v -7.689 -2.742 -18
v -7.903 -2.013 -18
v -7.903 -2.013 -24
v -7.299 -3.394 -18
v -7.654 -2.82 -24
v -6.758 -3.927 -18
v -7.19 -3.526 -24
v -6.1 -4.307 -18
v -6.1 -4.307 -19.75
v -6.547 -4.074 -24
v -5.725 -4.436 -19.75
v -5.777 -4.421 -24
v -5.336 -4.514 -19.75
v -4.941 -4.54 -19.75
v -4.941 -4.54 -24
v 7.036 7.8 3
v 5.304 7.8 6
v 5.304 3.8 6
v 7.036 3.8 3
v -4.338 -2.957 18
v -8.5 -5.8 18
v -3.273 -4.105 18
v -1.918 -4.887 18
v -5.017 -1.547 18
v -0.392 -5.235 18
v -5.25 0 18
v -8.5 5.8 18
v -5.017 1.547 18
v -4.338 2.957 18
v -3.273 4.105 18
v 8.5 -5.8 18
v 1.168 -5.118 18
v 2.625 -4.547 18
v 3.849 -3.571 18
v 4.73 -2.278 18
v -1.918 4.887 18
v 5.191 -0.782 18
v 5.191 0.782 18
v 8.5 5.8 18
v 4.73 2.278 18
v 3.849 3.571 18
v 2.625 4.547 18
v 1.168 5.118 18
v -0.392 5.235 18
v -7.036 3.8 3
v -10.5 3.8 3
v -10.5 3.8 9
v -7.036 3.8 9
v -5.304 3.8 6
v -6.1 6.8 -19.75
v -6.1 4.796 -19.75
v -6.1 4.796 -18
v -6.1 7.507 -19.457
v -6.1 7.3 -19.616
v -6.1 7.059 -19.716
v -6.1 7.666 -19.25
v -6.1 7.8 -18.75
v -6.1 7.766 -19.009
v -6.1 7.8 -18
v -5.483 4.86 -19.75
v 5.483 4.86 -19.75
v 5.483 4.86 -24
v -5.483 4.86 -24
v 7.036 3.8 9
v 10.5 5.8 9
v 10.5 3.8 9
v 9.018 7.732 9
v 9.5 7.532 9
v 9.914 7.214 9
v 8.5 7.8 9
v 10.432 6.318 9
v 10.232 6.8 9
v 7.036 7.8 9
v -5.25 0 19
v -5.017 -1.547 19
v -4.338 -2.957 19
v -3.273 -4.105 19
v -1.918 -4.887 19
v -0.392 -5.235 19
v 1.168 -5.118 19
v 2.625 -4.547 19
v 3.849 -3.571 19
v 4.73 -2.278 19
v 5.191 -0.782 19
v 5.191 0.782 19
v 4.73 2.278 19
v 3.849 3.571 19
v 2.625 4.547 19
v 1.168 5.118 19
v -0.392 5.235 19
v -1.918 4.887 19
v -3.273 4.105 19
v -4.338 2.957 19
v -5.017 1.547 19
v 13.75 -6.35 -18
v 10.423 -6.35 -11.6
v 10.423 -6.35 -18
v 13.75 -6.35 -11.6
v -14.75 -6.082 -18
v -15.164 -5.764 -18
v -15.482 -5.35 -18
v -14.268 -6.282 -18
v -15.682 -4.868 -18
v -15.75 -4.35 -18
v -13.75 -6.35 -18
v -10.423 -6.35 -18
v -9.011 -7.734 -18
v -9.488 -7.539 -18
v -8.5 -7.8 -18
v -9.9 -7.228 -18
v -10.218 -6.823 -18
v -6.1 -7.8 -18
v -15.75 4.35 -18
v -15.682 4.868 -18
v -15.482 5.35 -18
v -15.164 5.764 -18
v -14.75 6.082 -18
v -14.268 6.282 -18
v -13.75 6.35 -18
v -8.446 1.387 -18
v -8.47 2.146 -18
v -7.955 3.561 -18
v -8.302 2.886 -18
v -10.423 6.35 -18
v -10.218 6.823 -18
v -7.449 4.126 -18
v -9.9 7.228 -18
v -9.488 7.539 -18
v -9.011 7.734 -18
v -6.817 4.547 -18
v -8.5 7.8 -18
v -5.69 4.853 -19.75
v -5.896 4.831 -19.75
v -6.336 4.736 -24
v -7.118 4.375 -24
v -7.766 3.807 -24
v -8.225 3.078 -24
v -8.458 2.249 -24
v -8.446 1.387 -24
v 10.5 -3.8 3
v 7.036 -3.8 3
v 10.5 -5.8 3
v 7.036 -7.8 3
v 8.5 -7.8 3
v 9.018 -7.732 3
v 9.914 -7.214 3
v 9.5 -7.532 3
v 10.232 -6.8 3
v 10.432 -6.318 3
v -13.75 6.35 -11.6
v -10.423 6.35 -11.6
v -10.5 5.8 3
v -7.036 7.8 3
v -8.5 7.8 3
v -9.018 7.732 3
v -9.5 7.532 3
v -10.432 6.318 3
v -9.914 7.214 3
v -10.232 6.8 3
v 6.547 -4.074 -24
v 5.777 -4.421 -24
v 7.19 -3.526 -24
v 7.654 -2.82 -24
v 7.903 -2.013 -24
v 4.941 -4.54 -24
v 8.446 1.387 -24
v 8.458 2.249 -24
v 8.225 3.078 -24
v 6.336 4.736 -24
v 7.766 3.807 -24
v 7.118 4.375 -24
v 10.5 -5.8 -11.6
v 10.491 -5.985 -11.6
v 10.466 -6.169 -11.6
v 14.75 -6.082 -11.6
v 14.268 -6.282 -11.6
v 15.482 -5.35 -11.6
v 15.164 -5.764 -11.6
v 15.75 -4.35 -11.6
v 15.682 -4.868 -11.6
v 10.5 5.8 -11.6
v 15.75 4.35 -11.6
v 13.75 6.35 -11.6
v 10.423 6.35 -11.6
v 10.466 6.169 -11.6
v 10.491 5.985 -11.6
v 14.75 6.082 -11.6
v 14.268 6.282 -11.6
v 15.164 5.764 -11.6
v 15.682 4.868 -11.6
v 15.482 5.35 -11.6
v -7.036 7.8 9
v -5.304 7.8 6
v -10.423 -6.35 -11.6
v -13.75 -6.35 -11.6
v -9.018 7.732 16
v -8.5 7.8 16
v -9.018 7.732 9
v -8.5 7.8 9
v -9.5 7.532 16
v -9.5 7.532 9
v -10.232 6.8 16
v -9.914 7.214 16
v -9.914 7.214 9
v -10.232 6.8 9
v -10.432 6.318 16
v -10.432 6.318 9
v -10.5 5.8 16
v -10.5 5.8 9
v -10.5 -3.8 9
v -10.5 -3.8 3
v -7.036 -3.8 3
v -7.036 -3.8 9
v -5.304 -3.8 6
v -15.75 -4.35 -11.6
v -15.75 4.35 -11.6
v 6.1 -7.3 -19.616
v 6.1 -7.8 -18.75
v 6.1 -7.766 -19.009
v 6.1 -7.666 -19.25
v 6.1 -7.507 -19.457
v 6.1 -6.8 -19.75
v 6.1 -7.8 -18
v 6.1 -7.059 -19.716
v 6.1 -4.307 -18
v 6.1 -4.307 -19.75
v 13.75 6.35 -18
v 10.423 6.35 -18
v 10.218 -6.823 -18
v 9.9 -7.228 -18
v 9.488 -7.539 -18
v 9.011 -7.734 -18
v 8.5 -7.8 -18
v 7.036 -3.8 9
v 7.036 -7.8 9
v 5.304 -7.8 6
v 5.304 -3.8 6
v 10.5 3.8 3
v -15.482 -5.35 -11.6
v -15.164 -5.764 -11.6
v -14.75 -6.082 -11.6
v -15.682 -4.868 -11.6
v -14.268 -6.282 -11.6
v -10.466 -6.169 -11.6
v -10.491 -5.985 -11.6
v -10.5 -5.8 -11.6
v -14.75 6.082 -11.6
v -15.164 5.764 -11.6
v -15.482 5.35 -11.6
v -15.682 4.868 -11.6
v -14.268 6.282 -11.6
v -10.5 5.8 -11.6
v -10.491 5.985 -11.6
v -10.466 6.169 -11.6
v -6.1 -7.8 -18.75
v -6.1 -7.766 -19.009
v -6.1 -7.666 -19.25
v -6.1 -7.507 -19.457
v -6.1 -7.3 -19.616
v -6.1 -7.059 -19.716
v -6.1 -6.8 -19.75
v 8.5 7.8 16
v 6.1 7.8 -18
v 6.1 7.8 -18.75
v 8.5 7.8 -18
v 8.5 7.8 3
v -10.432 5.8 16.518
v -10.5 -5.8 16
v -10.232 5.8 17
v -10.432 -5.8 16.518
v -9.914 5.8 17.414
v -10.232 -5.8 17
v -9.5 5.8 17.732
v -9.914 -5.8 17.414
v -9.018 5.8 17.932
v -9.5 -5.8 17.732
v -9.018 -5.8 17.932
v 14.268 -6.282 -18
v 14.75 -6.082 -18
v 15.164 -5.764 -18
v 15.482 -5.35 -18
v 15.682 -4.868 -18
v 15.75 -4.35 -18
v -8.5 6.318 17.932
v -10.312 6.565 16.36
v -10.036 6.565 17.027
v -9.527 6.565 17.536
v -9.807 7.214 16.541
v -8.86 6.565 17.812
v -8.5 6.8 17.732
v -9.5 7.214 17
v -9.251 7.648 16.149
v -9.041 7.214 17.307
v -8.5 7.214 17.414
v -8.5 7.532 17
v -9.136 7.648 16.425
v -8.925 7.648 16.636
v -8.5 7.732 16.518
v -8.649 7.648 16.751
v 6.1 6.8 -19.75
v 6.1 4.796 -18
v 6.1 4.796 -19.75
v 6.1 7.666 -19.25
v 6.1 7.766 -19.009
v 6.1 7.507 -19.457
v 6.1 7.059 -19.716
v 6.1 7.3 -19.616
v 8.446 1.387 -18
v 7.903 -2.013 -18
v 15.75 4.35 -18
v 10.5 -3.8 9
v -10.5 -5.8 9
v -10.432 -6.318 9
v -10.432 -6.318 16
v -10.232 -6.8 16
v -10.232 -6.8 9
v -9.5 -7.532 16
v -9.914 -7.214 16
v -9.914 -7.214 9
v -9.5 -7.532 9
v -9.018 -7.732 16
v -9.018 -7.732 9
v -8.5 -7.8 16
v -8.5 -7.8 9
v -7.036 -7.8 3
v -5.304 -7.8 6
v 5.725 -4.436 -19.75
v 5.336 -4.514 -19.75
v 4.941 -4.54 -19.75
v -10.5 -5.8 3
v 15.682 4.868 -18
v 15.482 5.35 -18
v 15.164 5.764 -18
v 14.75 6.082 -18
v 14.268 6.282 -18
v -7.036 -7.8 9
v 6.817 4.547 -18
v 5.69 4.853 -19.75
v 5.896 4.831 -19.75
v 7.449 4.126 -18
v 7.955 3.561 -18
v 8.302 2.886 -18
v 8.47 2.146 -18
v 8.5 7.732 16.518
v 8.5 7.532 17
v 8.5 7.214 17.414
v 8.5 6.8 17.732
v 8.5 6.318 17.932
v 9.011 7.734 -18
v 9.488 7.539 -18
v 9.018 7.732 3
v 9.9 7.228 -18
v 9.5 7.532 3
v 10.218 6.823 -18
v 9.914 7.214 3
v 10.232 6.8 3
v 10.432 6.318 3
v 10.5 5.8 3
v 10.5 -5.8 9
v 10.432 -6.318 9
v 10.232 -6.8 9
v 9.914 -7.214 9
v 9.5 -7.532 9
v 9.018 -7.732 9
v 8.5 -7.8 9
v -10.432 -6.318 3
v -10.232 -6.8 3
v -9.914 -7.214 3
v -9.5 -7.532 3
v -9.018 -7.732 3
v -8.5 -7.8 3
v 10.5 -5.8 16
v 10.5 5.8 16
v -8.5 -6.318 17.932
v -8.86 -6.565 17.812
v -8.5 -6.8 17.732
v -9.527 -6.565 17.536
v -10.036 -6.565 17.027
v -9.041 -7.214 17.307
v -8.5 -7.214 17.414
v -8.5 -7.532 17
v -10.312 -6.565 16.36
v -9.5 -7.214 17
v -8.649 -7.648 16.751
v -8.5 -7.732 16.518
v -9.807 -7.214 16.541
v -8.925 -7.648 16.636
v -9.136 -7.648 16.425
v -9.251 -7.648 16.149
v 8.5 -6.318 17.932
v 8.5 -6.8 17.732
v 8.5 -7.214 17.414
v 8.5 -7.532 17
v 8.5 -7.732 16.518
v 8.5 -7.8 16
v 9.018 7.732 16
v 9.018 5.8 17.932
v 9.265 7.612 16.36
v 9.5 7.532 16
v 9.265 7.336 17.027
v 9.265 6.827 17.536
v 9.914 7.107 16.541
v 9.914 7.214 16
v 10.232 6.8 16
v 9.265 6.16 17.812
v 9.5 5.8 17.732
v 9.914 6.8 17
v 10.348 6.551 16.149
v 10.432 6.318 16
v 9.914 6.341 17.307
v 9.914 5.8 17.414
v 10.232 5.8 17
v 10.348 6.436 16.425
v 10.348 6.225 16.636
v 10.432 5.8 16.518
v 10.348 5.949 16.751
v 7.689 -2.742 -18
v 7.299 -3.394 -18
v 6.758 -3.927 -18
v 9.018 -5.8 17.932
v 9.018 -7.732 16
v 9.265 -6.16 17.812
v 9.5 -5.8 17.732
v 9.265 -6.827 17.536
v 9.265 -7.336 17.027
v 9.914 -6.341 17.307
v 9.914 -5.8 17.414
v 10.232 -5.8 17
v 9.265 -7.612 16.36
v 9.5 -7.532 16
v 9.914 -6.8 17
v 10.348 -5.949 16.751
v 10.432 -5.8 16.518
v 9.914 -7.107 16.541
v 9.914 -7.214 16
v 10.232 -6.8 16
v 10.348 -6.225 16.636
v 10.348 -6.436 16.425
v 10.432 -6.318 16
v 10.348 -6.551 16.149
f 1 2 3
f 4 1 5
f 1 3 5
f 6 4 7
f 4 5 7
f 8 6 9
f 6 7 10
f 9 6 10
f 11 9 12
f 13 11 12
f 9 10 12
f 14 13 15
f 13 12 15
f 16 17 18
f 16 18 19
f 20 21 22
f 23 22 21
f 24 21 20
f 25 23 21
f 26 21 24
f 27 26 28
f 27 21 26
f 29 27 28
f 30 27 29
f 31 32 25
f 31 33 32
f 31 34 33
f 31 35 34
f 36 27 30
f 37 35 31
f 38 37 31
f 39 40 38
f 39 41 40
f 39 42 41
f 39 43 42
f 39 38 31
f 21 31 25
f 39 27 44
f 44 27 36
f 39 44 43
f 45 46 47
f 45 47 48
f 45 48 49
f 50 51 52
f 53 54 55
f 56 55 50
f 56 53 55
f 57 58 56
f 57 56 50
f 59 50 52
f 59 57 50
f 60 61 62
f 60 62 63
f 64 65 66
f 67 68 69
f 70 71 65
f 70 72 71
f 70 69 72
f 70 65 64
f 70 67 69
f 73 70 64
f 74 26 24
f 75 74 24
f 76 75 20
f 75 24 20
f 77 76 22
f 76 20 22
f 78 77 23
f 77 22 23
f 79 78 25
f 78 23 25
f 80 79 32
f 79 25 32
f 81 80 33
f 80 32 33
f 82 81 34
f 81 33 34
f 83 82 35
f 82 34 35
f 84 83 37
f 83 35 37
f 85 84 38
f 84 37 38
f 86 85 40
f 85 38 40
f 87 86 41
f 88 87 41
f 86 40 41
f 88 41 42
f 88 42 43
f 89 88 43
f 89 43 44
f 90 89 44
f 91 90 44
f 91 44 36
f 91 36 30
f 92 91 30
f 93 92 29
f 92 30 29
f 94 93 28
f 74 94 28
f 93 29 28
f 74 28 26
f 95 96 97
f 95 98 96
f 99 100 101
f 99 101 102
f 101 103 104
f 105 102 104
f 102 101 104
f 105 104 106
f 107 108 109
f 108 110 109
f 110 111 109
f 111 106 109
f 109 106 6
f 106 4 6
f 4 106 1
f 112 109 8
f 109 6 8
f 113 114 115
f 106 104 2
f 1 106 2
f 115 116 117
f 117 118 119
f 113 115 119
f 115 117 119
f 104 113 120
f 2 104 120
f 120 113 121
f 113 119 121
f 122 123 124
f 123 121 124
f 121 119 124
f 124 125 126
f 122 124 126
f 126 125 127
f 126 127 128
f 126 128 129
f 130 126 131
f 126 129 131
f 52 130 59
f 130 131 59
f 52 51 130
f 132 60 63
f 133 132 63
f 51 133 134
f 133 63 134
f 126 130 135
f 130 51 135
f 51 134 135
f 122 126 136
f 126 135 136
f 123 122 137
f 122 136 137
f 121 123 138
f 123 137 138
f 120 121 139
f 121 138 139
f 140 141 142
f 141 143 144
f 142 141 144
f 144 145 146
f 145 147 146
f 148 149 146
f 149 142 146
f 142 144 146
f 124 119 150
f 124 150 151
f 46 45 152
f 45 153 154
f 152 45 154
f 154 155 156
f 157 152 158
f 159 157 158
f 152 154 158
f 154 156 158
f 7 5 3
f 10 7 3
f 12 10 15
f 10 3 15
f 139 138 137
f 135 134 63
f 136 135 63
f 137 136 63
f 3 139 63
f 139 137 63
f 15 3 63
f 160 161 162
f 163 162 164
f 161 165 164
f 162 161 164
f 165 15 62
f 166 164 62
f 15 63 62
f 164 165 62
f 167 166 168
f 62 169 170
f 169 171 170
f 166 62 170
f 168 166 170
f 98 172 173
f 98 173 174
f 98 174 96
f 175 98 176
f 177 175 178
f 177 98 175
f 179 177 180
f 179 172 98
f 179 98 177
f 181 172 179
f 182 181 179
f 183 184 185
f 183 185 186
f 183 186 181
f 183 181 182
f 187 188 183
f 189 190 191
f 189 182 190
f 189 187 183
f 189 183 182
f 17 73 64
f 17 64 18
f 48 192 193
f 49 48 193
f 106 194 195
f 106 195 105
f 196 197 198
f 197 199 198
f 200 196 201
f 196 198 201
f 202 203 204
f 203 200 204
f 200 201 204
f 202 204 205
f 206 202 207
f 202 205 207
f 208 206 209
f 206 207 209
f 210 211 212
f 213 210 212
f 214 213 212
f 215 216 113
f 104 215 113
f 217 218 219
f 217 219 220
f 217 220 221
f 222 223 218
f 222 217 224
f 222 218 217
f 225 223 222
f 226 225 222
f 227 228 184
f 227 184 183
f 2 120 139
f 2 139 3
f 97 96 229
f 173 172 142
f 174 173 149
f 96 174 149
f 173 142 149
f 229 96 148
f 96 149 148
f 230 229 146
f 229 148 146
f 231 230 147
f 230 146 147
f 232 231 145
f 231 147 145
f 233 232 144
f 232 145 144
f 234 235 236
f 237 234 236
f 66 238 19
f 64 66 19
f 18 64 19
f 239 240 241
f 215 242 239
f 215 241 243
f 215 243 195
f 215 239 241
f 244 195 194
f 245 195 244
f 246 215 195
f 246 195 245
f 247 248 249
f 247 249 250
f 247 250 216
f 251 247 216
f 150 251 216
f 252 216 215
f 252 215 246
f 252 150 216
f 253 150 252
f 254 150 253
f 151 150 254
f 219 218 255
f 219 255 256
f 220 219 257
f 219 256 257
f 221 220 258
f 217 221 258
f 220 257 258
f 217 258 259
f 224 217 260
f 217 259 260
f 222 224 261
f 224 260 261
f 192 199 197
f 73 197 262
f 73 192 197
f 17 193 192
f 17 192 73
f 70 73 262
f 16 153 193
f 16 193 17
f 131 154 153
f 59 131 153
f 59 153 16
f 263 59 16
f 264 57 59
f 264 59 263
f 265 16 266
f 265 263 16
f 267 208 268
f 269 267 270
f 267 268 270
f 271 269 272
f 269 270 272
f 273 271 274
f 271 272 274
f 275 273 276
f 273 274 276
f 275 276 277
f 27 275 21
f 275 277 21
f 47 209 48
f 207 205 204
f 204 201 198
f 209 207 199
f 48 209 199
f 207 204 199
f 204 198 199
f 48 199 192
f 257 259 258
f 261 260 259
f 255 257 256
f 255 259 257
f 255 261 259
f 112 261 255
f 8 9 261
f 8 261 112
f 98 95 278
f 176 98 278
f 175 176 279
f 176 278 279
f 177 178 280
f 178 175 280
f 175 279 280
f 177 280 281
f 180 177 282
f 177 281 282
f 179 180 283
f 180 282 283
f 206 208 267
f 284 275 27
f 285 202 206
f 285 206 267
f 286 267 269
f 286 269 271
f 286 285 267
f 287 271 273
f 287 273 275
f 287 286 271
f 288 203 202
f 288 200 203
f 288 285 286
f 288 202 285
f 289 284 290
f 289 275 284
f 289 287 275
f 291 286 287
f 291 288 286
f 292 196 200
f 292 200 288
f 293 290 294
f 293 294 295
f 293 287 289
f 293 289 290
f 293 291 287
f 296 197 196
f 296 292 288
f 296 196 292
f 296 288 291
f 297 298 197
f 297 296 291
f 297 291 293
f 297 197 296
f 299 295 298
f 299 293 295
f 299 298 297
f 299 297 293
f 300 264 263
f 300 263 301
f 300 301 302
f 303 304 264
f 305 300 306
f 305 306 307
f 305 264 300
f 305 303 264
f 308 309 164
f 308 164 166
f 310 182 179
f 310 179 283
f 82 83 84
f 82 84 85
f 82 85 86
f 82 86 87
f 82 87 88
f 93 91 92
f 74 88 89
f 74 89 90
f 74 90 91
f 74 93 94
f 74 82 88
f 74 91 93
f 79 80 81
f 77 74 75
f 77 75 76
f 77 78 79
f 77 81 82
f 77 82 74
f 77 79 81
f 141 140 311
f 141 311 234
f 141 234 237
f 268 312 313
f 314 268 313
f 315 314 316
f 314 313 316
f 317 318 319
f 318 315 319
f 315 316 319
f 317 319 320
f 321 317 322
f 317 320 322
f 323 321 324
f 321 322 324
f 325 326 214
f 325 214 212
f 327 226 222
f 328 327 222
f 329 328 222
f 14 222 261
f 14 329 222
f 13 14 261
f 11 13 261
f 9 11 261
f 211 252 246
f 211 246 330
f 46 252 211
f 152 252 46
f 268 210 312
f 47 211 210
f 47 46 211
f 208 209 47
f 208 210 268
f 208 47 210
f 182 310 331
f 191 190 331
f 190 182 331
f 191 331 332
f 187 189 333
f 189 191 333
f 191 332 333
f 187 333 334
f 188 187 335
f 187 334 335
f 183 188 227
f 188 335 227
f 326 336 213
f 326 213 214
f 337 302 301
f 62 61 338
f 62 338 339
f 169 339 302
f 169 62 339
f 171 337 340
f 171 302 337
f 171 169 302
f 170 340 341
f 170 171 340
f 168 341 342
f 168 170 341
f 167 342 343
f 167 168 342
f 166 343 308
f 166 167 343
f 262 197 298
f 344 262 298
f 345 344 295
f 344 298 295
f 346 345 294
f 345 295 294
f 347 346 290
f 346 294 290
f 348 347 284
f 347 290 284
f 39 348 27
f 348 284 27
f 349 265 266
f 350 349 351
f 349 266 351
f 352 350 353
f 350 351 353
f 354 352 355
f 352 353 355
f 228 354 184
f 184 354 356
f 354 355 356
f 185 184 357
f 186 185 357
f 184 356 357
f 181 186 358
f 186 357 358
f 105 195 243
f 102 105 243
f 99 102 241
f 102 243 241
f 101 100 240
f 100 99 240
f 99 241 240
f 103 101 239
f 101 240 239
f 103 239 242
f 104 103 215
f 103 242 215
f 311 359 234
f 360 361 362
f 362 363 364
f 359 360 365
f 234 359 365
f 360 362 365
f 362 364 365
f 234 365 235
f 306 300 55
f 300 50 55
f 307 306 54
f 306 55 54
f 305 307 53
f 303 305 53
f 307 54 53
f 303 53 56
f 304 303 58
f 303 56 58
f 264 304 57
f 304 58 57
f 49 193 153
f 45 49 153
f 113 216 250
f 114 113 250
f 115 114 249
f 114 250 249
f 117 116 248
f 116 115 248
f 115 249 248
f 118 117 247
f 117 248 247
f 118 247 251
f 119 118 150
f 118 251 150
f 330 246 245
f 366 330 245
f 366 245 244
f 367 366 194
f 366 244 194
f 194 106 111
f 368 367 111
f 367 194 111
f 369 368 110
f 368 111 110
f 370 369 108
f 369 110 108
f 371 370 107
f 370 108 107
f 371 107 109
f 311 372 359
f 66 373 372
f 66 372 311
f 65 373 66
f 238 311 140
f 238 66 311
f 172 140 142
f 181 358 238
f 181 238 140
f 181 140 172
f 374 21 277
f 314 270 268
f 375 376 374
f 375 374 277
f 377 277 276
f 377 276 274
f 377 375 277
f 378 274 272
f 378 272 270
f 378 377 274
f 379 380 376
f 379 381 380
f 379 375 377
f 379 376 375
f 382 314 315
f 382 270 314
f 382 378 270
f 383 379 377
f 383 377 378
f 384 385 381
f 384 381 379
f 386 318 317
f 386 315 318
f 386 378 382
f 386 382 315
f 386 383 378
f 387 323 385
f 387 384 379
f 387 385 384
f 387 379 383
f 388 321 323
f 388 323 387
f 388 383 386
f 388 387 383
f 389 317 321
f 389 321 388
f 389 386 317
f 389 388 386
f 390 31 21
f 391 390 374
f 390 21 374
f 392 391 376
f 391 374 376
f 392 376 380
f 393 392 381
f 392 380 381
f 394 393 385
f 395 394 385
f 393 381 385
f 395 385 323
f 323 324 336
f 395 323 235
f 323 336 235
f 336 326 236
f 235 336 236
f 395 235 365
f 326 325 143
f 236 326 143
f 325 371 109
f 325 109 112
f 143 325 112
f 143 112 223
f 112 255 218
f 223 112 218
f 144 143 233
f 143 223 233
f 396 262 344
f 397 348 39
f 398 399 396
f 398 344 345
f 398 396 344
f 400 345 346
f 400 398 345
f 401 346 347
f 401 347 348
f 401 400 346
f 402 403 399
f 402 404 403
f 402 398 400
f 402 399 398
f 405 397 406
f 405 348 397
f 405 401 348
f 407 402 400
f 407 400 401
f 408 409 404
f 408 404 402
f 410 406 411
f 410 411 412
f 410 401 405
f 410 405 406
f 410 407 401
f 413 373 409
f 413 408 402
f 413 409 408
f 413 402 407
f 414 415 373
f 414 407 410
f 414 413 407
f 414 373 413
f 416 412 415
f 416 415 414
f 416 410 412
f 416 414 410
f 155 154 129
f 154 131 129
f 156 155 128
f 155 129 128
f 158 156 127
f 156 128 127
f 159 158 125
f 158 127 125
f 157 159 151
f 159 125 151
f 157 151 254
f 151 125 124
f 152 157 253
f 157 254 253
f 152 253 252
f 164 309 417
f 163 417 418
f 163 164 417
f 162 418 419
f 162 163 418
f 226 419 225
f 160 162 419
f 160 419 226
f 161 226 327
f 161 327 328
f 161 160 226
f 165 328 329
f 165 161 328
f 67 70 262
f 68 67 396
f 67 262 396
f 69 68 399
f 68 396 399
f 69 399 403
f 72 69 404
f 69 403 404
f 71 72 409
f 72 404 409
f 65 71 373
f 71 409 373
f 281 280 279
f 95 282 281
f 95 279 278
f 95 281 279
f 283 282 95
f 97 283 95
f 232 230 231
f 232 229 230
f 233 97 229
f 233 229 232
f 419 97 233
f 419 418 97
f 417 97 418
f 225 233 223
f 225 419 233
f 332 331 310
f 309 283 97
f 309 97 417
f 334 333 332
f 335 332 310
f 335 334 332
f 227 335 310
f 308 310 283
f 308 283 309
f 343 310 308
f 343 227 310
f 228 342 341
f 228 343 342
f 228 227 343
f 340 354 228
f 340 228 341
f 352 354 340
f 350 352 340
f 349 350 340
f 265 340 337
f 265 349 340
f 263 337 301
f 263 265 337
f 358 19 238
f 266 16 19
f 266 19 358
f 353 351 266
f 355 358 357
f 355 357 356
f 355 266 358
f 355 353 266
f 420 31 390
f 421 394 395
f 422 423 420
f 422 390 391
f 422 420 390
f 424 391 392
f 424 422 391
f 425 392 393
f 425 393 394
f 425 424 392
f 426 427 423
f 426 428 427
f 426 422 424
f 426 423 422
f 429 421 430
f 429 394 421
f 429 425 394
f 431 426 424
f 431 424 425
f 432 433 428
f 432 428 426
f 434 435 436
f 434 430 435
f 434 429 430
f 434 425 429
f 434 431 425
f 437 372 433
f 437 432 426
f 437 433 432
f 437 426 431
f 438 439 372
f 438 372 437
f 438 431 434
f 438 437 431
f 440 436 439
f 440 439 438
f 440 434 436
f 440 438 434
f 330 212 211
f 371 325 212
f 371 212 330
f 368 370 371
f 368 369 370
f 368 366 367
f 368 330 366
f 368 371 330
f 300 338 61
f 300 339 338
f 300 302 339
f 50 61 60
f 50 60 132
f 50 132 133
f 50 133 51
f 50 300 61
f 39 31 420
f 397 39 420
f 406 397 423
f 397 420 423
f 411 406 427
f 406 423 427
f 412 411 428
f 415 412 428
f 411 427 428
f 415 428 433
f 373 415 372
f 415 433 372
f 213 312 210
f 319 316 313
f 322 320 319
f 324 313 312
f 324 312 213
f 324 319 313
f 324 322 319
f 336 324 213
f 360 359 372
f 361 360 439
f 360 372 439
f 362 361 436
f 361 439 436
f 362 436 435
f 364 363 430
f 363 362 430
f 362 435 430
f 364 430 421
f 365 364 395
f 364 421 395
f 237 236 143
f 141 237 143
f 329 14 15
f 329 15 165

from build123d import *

# Parameters (mm, degrees)
EXTRUDE_1_DEPTH     = 7.8
SKETCH_3_R          = 5.25
EXTRUDE_2_DEPTH     = 1
SKETCH_5_W          = 31.5
SKETCH_5_H          = 6.4
EXTRUDE_3_DEPTH     = 6.35
EXTRUDE_4_DEPTH     = 6
FILLET_1_R          = 3
FILLET_2_R          = 2
FILLET_3_R          = 1
CUT_EXTRUDE_1_DEPTH = 4


with BuildPart() as part:
    # 草图1 → 凸台-拉伸1 (new, symmetric)
    with BuildSketch(Plane(origin=(0, 0, 0), x_dir=(1, 0, 0), z_dir=(0, 1, 0))):
        Polygon((-6.1, 18), (-10.5, 18), (-10.5, -18), (10.5, -18), (10.5, 18), (6.1, 18), (6.1, 19.75), (-6.1, 19.75), align=None)
    extrude(amount=EXTRUDE_1_DEPTH, both=True)

    # 草图3 → 凸台-拉伸2 (add)
    with BuildSketch(Plane.XY.offset(18)):
        with Locations(Location((0, 0, 0), (0, 0, 180))):
            Circle(SKETCH_3_R)
    extrude(amount=EXTRUDE_2_DEPTH)

    # 草图5 → 凸台-拉伸3 (add, symmetric)
    with BuildSketch(Plane(origin=(0, 0, 0), x_dir=(1, 0, 0), z_dir=(0, 1, 0))):
        with Locations((0, 14.8)):
            Rectangle(SKETCH_5_W, SKETCH_5_H)
    extrude(amount=EXTRUDE_3_DEPTH, both=True)

    # 草图6 → 凸台-拉伸4 (add)
    with BuildSketch(Plane(origin=(0, 0, -18), x_dir=(-1, 0, 0), z_dir=(0, 0, -1))):
        Polygon((-9, 4.85990087), (9, 4.85990087), (7.5, -4.54009913), (-7.5, -4.54009913), align=None)
    extrude(amount=EXTRUDE_4_DEPTH)

    # 圆角1
    fillet_1_edges = [part.edges().sort_by_distance(p)[0] for p in [
        (-7.5, -4.54009913, -21),
        (7.5, -4.54009913, -21),
        (9, 4.85990087, -21),
        (-9, 4.85990087, -21),
    ]]
    fillet(fillet_1_edges, radius=FILLET_1_R)

    # 圆角2
    # the kernel refuses this fillet: 2 mm, written as the material it takes off along each edge
    with BuildSketch(Plane(origin=(-8.5, -5.8, 16), x_dir=(-1, 0, 0), z_dir=(0, -1, 0))) as fillet_2_piece_1_section:
        Polygon((0, 0), (FILLET_2_R, 0), (FILLET_2_R, -FILLET_2_R), (0, -FILLET_2_R), align=None)
    fillet_2_piece_1 = extrude(amount=FILLET_2_R, mode=Mode.PRIVATE)
    fillet_2_piece_1 = fillet_2_piece_1 - Plane(origin=(-8.5, -5.8, 16), x_dir=(0.7071067811865474, 0, -0.7071067811865476), z_dir=(0, -1, 0)) * Sphere(FILLET_2_R, mode=Mode.PRIVATE)
    add(fillet_2_piece_1, mode=Mode.SUBTRACT)
    with BuildSketch(Plane(origin=(8.5, -5.8, 16), x_dir=(0, -1, 0), z_dir=(1, 0, 0))) as fillet_2_piece_2_section:
        Polygon((0, 0), (FILLET_2_R, 0), (FILLET_2_R, -FILLET_2_R), (0, -FILLET_2_R), align=None)
    fillet_2_piece_2 = extrude(amount=FILLET_2_R, mode=Mode.PRIVATE)
    fillet_2_piece_2 = fillet_2_piece_2 - Plane(origin=(8.5, -5.8, 16), x_dir=(0, 0.7071067811865475, -0.7071067811865475), z_dir=(1, 0, 0)) * Sphere(FILLET_2_R, mode=Mode.PRIVATE)
    add(fillet_2_piece_2, mode=Mode.SUBTRACT)
    with BuildSketch(Plane(origin=(8.5, 5.8, 16), x_dir=(0, 1, 0), z_dir=(1, 0, 0))) as fillet_2_piece_3_section:
        Polygon((0, 0), (FILLET_2_R, 0), (FILLET_2_R, FILLET_2_R), (0, FILLET_2_R), align=None)
    fillet_2_piece_3 = extrude(amount=FILLET_2_R, mode=Mode.PRIVATE)
    fillet_2_piece_3 = fillet_2_piece_3 - Plane(origin=(8.5, 5.8, 16), x_dir=(0, -0.7071067811865475, -0.7071067811865475), z_dir=(1, 0, 0)) * Sphere(FILLET_2_R, mode=Mode.PRIVATE)
    add(fillet_2_piece_3, mode=Mode.SUBTRACT)
    with BuildSketch(Plane(origin=(-8.5, 5.8, 16), x_dir=(-1, 0, 0), z_dir=(0, 1, 0))) as fillet_2_piece_4_section:
        Polygon((0, 0), (FILLET_2_R, 0), (FILLET_2_R, FILLET_2_R), (0, FILLET_2_R), align=None)
    fillet_2_piece_4 = extrude(amount=FILLET_2_R, mode=Mode.PRIVATE)
    fillet_2_piece_4 = fillet_2_piece_4 - Plane(origin=(-8.5, 5.8, 16), x_dir=(0.7071067811865474, 0, -0.7071067811865476), z_dir=(0, 1, 0)) * Sphere(FILLET_2_R, mode=Mode.PRIVATE)
    add(fillet_2_piece_4, mode=Mode.SUBTRACT)
    with BuildSketch(Plane(origin=(-8.5, -7.8, 18), x_dir=(0, 0, -1), z_dir=(1, 0, 0))) as fillet_2_piece_5:
        with BuildLine():
            CenterArc((FILLET_2_R, FILLET_2_R), FILLET_2_R, 180, 90)
            Line((0, FILLET_2_R), (0, 0))
            Line((0, 0), (FILLET_2_R, 0))
        make_face()
    extrude(amount=17, mode=Mode.SUBTRACT)
    with BuildSketch(Plane(origin=(10.5, -5.8, 18), x_dir=(-1, 0, 0), z_dir=(0, 1, 0)), Plane(origin=(-10.5, -5.8, 18), x_dir=(0, 0, -1), z_dir=(0, 1, 0))) as fillet_2_piece_6:
        with BuildLine():
            CenterArc((FILLET_2_R, -FILLET_2_R), FILLET_2_R, 90, 90)
            Line((0, -FILLET_2_R), (0, 0))
            Line((0, 0), (FILLET_2_R, 0))
        make_face()
    extrude(amount=11.6, mode=Mode.SUBTRACT)
    with BuildSketch(Plane(origin=(-8.5, 7.8, 18), x_dir=(0, 0, -1), z_dir=(1, 0, 0))) as fillet_2_piece_7:
        with BuildLine():
            CenterArc((FILLET_2_R, -FILLET_2_R), FILLET_2_R, 90, 90)
            Line((0, -FILLET_2_R), (0, 0))
            Line((0, 0), (FILLET_2_R, 0))
        make_face()
    extrude(amount=17, mode=Mode.SUBTRACT)
    with BuildSketch(Plane(origin=(-10.5, -7.8, -23), x_dir=(1, 0, 0), z_dir=(0, 0, 1))) as fillet_2_piece_8_section:
        with BuildLine():
            CenterArc((FILLET_2_R, FILLET_2_R), FILLET_2_R, 180, 90)
            Line((0, FILLET_2_R), (0, 0))
            Line((0, 0), (FILLET_2_R, 0))
        make_face()
    fillet_2_piece_8 = extrude(amount=39, mode=Mode.PRIVATE)
    fillet_2_piece_8 = split(fillet_2_piece_8, bisect_by=Plane(origin=(-10.030513344, -6.35, -17.3), z_dir=(0, -1, 0)), keep=Keep.TOP, mode=Mode.PRIVATE)
    fillet_2_piece_8 = split(fillet_2_piece_8, bisect_by=Plane(origin=(-10.030513344, -7.391821247, -11.6), z_dir=(0, 0, -1)), keep=Keep.TOP, mode=Mode.PRIVATE)
    add(fillet_2_piece_8, mode=Mode.SUBTRACT)
    with BuildSketch(Plane(origin=(-10.5, -7.8, -23), x_dir=(1, 0, 0), z_dir=(0, 0, 1))) as fillet_2_piece_9_section:
        with BuildLine():
            CenterArc((FILLET_2_R, FILLET_2_R), FILLET_2_R, 180, 90)
            Line((0, FILLET_2_R), (0, 0))
            Line((0, 0), (FILLET_2_R, 0))
        make_face()
    fillet_2_piece_9 = extrude(amount=39, mode=Mode.PRIVATE)
    fillet_2_piece_9 = split(fillet_2_piece_9, bisect_by=Plane(origin=(-10.030513344, -6.35, 2.2), z_dir=(0, -1, 0)), keep=Keep.TOP, mode=Mode.PRIVATE)
    fillet_2_piece_9 = split(fillet_2_piece_9, bisect_by=Plane(origin=(-10.030513344, -7.391821247, -11.6), z_dir=(0, 0, 1)), keep=Keep.TOP, mode=Mode.PRIVATE)
    add(fillet_2_piece_9, mode=Mode.SUBTRACT)
    with BuildSketch(Plane(origin=(-10.5, -7.8, -23), x_dir=(1, 0, 0), z_dir=(0, 0, 1))) as fillet_2_piece_10_section:
        with BuildLine():
            CenterArc((FILLET_2_R, FILLET_2_R), FILLET_2_R, 180, 90)
            Line((0, FILLET_2_R), (0, 0))
            Line((0, 0), (FILLET_2_R, 0))
        make_face()
    fillet_2_piece_10 = extrude(amount=39, mode=Mode.PRIVATE)
    fillet_2_piece_10 = split(fillet_2_piece_10, bisect_by=Plane(origin=(-10.503237221, -6.35, 2.2), z_dir=(0, 1, 0)), keep=Keep.TOP, mode=Mode.PRIVATE)
    fillet_2_piece_10 = split(fillet_2_piece_10, bisect_by=Plane(origin=(-10.503237221, -6.128742069, -11.6), z_dir=(0, 0, 1)), keep=Keep.TOP, mode=Mode.PRIVATE)
    add(fillet_2_piece_10, mode=Mode.SUBTRACT)
    with BuildSketch(Plane(origin=(-10.5, 7.8, -23), x_dir=(0, -1, 0), z_dir=(0, 0, 1))) as fillet_2_piece_11_section:
        with BuildLine():
            CenterArc((FILLET_2_R, FILLET_2_R), FILLET_2_R, 180, 90)
            Line((0, FILLET_2_R), (0, 0))
            Line((0, 0), (FILLET_2_R, 0))
        make_face()
    fillet_2_piece_11 = extrude(amount=39, mode=Mode.PRIVATE)
    fillet_2_piece_11 = split(fillet_2_piece_11, bisect_by=Plane(origin=(-10.030513344, 7.391821247, -11.6), z_dir=(0, 0, -1)), keep=Keep.TOP, mode=Mode.PRIVATE)
    fillet_2_piece_11 = split(fillet_2_piece_11, bisect_by=Plane(origin=(-10.030513344, 6.35, -17.3), z_dir=(0, 1, 0)), keep=Keep.TOP, mode=Mode.PRIVATE)
    add(fillet_2_piece_11, mode=Mode.SUBTRACT)
    with BuildSketch(Plane(origin=(-10.5, 7.8, -23), x_dir=(0, -1, 0), z_dir=(0, 0, 1))) as fillet_2_piece_12_section:
        with BuildLine():
            CenterArc((FILLET_2_R, FILLET_2_R), FILLET_2_R, 180, 90)
            Line((0, FILLET_2_R), (0, 0))
            Line((0, 0), (FILLET_2_R, 0))
        make_face()
    fillet_2_piece_12 = extrude(amount=39, mode=Mode.PRIVATE)
    fillet_2_piece_12 = split(fillet_2_piece_12, bisect_by=Plane(origin=(-10.503237221, 6.128742069, -11.6), z_dir=(0, 0, 1)), keep=Keep.TOP, mode=Mode.PRIVATE)
    fillet_2_piece_12 = split(fillet_2_piece_12, bisect_by=Plane(origin=(-10.503237221, 6.35, 2.2), z_dir=(0, -1, 0)), keep=Keep.TOP, mode=Mode.PRIVATE)
    add(fillet_2_piece_12, mode=Mode.SUBTRACT)
    with BuildSketch(Plane(origin=(-10.5, 7.8, -23), x_dir=(0, -1, 0), z_dir=(0, 0, 1))) as fillet_2_piece_13_section:
        with BuildLine():
            CenterArc((FILLET_2_R, FILLET_2_R), FILLET_2_R, 180, 90)
            Line((0, FILLET_2_R), (0, 0))
            Line((0, 0), (FILLET_2_R, 0))
        make_face()
    fillet_2_piece_13 = extrude(amount=39, mode=Mode.PRIVATE)
    fillet_2_piece_13 = split(fillet_2_piece_13, bisect_by=Plane(origin=(-10.030513344, 7.391821247, -11.6), z_dir=(0, 0, 1)), keep=Keep.TOP, mode=Mode.PRIVATE)
    fillet_2_piece_13 = split(fillet_2_piece_13, bisect_by=Plane(origin=(-10.030513344, 6.35, 2.2), z_dir=(0, 1, 0)), keep=Keep.TOP, mode=Mode.PRIVATE)
    add(fillet_2_piece_13, mode=Mode.SUBTRACT)
    with BuildSketch(Plane(origin=(10.5, 7.8, 16), x_dir=(-1, 0, 0), z_dir=(0, 0, -1))) as fillet_2_piece_14_section:
        with BuildLine():
            CenterArc((FILLET_2_R, -FILLET_2_R), FILLET_2_R, 90, 90)
            Line((0, -FILLET_2_R), (0, 0))
            Line((0, 0), (FILLET_2_R, 0))
        make_face()
    fillet_2_piece_14 = extrude(amount=39, mode=Mode.PRIVATE)
    fillet_2_piece_14 = split(fillet_2_piece_14, bisect_by=Plane(origin=(10.030513344, 6.35, 2.2), z_dir=(0, 1, 0)), keep=Keep.TOP, mode=Mode.PRIVATE)
    fillet_2_piece_14 = split(fillet_2_piece_14, bisect_by=Plane(origin=(10.030513344, 7.391821247, -11.6), z_dir=(0, 0, 1)), keep=Keep.TOP, mode=Mode.PRIVATE)
    add(fillet_2_piece_14, mode=Mode.SUBTRACT)
    with BuildSketch(Plane(origin=(10.5, 7.8, 16), x_dir=(-1, 0, 0), z_dir=(0, 0, -1))) as fillet_2_piece_15_section:
        with BuildLine():
            CenterArc((FILLET_2_R, -FILLET_2_R), FILLET_2_R, 90, 90)
            Line((0, -FILLET_2_R), (0, 0))
            Line((0, 0), (FILLET_2_R, 0))
        make_face()
    fillet_2_piece_15 = extrude(amount=39, mode=Mode.PRIVATE)
    fillet_2_piece_15 = split(fillet_2_piece_15, bisect_by=Plane(origin=(10.503237221, 6.35, 2.2), z_dir=(0, -1, 0)), keep=Keep.TOP, mode=Mode.PRIVATE)
    fillet_2_piece_15 = split(fillet_2_piece_15, bisect_by=Plane(origin=(10.503237221, 6.128742069, -11.6), z_dir=(0, 0, 1)), keep=Keep.TOP, mode=Mode.PRIVATE)
    add(fillet_2_piece_15, mode=Mode.SUBTRACT)
    with BuildSketch(Plane(origin=(10.5, 7.8, 16), x_dir=(-1, 0, 0), z_dir=(0, 0, -1))) as fillet_2_piece_16_section:
        with BuildLine():
            CenterArc((FILLET_2_R, -FILLET_2_R), FILLET_2_R, 90, 90)
            Line((0, -FILLET_2_R), (0, 0))
            Line((0, 0), (FILLET_2_R, 0))
        make_face()
    fillet_2_piece_16 = extrude(amount=39, mode=Mode.PRIVATE)
    fillet_2_piece_16 = split(fillet_2_piece_16, bisect_by=Plane(origin=(10.030513344, 6.35, -17.3), z_dir=(0, 1, 0)), keep=Keep.TOP, mode=Mode.PRIVATE)
    fillet_2_piece_16 = split(fillet_2_piece_16, bisect_by=Plane(origin=(10.030513344, 7.391821247, -11.6), z_dir=(0, 0, -1)), keep=Keep.TOP, mode=Mode.PRIVATE)
    add(fillet_2_piece_16, mode=Mode.SUBTRACT)
    with BuildSketch(Plane(origin=(10.5, -7.8, 16), x_dir=(-1, 0, 0), z_dir=(0, 0, -1))) as fillet_2_piece_17_section:
        with BuildLine():
            CenterArc((FILLET_2_R, FILLET_2_R), FILLET_2_R, 180, 90)
            Line((0, FILLET_2_R), (0, 0))
            Line((0, 0), (FILLET_2_R, 0))
        make_face()
    fillet_2_piece_17 = extrude(amount=39, mode=Mode.PRIVATE)
    fillet_2_piece_17 = split(fillet_2_piece_17, bisect_by=Plane(origin=(10.030513344, -7.391821247, -11.6), z_dir=(0, 0, 1)), keep=Keep.TOP, mode=Mode.PRIVATE)
    fillet_2_piece_17 = split(fillet_2_piece_17, bisect_by=Plane(origin=(10.030513344, -6.35, 2.2), z_dir=(0, -1, 0)), keep=Keep.TOP, mode=Mode.PRIVATE)
    add(fillet_2_piece_17, mode=Mode.SUBTRACT)
    with BuildSketch(Plane(origin=(10.5, -7.8, 16), x_dir=(-1, 0, 0), z_dir=(0, 0, -1))) as fillet_2_piece_18_section:
        with BuildLine():
            CenterArc((FILLET_2_R, FILLET_2_R), FILLET_2_R, 180, 90)
            Line((0, FILLET_2_R), (0, 0))
            Line((0, 0), (FILLET_2_R, 0))
        make_face()
    fillet_2_piece_18 = extrude(amount=39, mode=Mode.PRIVATE)
    fillet_2_piece_18 = split(fillet_2_piece_18, bisect_by=Plane(origin=(10.503237221, -6.128742069, -11.6), z_dir=(0, 0, 1)), keep=Keep.TOP, mode=Mode.PRIVATE)
    fillet_2_piece_18 = split(fillet_2_piece_18, bisect_by=Plane(origin=(10.503237221, -6.35, 2.2), z_dir=(0, 1, 0)), keep=Keep.TOP, mode=Mode.PRIVATE)
    add(fillet_2_piece_18, mode=Mode.SUBTRACT)
    with BuildSketch(Plane(origin=(10.5, -7.8, 16), x_dir=(-1, 0, 0), z_dir=(0, 0, -1))) as fillet_2_piece_19_section:
        with BuildLine():
            CenterArc((FILLET_2_R, FILLET_2_R), FILLET_2_R, 180, 90)
            Line((0, FILLET_2_R), (0, 0))
            Line((0, 0), (FILLET_2_R, 0))
        make_face()
    fillet_2_piece_19 = extrude(amount=39, mode=Mode.PRIVATE)
    fillet_2_piece_19 = split(fillet_2_piece_19, bisect_by=Plane(origin=(10.030513344, -7.391821247, -11.6), z_dir=(0, 0, -1)), keep=Keep.TOP, mode=Mode.PRIVATE)
    fillet_2_piece_19 = split(fillet_2_piece_19, bisect_by=Plane(origin=(10.030513344, -6.35, -17.3), z_dir=(0, -1, 0)), keep=Keep.TOP, mode=Mode.PRIVATE)
    add(fillet_2_piece_19, mode=Mode.SUBTRACT)
    with BuildSketch(Plane(origin=(15.75, -6.35, -23), x_dir=(-1, 0, 0), z_dir=(0, 0, 1)), Plane(origin=(-15.75, 6.35, -6.6), x_dir=(0, -1, 0), z_dir=(0, 0, -1)), Plane(origin=(-15.75, -6.35, -6.6), x_dir=(1, 0, 0), z_dir=(0, 0, -1))) as fillet_2_piece_20:
        with BuildLine():
            CenterArc((FILLET_2_R, -FILLET_2_R), FILLET_2_R, 90, 90)
            Line((0, -FILLET_2_R), (0, 0))
            Line((0, 0), (FILLET_2_R, 0))
        make_face()
    extrude(amount=16.4, mode=Mode.SUBTRACT)
    with BuildSketch(Plane(origin=(15.75, 6.35, -23), x_dir=(-1, 0, 0), z_dir=(0, 0, 1))) as fillet_2_piece_21:
        with BuildLine():
            CenterArc((FILLET_2_R, FILLET_2_R), FILLET_2_R, 180, 90)
            Line((0, FILLET_2_R), (0, 0))
            Line((0, 0), (FILLET_2_R, 0))
        make_face()
    extrude(amount=16.4, mode=Mode.SUBTRACT)

    # 圆角3
    fillet_3_edges = [part.edges().sort_by_distance(p)[0] for p in [
        (0, 7.8, -19.75),
        (0, -7.8, -19.75),
    ]]
    fillet(fillet_3_edges, radius=FILLET_3_R)

    # 草图7 → 切除-拉伸1 (cut)
    with BuildSketch(Plane(origin=(0, 7.8, 0), x_dir=(1, 0, 0), z_dir=(0, 1, 0))):
        Polygon((-12.232050808, -6), (-10.5, -9), (-7.035898385, -9), (-5.303847577, -6), (-7.035898385, -3), (-10.5, -3), align=None)
        Polygon((10.5, -3), (12.232050808, -6), (10.5, -9), (7.035898385, -9), (5.303847577, -6), (7.035898385, -3), align=None)
    cut_extrude_1 = extrude(amount=-CUT_EXTRUDE_1_DEPTH, mode=Mode.SUBTRACT)

    # 镜向1: 切除-拉伸1 across plane
    add(cut_extrude_1.mirror(Plane.ZX), mode=Mode.SUBTRACT)


solid = part.part
